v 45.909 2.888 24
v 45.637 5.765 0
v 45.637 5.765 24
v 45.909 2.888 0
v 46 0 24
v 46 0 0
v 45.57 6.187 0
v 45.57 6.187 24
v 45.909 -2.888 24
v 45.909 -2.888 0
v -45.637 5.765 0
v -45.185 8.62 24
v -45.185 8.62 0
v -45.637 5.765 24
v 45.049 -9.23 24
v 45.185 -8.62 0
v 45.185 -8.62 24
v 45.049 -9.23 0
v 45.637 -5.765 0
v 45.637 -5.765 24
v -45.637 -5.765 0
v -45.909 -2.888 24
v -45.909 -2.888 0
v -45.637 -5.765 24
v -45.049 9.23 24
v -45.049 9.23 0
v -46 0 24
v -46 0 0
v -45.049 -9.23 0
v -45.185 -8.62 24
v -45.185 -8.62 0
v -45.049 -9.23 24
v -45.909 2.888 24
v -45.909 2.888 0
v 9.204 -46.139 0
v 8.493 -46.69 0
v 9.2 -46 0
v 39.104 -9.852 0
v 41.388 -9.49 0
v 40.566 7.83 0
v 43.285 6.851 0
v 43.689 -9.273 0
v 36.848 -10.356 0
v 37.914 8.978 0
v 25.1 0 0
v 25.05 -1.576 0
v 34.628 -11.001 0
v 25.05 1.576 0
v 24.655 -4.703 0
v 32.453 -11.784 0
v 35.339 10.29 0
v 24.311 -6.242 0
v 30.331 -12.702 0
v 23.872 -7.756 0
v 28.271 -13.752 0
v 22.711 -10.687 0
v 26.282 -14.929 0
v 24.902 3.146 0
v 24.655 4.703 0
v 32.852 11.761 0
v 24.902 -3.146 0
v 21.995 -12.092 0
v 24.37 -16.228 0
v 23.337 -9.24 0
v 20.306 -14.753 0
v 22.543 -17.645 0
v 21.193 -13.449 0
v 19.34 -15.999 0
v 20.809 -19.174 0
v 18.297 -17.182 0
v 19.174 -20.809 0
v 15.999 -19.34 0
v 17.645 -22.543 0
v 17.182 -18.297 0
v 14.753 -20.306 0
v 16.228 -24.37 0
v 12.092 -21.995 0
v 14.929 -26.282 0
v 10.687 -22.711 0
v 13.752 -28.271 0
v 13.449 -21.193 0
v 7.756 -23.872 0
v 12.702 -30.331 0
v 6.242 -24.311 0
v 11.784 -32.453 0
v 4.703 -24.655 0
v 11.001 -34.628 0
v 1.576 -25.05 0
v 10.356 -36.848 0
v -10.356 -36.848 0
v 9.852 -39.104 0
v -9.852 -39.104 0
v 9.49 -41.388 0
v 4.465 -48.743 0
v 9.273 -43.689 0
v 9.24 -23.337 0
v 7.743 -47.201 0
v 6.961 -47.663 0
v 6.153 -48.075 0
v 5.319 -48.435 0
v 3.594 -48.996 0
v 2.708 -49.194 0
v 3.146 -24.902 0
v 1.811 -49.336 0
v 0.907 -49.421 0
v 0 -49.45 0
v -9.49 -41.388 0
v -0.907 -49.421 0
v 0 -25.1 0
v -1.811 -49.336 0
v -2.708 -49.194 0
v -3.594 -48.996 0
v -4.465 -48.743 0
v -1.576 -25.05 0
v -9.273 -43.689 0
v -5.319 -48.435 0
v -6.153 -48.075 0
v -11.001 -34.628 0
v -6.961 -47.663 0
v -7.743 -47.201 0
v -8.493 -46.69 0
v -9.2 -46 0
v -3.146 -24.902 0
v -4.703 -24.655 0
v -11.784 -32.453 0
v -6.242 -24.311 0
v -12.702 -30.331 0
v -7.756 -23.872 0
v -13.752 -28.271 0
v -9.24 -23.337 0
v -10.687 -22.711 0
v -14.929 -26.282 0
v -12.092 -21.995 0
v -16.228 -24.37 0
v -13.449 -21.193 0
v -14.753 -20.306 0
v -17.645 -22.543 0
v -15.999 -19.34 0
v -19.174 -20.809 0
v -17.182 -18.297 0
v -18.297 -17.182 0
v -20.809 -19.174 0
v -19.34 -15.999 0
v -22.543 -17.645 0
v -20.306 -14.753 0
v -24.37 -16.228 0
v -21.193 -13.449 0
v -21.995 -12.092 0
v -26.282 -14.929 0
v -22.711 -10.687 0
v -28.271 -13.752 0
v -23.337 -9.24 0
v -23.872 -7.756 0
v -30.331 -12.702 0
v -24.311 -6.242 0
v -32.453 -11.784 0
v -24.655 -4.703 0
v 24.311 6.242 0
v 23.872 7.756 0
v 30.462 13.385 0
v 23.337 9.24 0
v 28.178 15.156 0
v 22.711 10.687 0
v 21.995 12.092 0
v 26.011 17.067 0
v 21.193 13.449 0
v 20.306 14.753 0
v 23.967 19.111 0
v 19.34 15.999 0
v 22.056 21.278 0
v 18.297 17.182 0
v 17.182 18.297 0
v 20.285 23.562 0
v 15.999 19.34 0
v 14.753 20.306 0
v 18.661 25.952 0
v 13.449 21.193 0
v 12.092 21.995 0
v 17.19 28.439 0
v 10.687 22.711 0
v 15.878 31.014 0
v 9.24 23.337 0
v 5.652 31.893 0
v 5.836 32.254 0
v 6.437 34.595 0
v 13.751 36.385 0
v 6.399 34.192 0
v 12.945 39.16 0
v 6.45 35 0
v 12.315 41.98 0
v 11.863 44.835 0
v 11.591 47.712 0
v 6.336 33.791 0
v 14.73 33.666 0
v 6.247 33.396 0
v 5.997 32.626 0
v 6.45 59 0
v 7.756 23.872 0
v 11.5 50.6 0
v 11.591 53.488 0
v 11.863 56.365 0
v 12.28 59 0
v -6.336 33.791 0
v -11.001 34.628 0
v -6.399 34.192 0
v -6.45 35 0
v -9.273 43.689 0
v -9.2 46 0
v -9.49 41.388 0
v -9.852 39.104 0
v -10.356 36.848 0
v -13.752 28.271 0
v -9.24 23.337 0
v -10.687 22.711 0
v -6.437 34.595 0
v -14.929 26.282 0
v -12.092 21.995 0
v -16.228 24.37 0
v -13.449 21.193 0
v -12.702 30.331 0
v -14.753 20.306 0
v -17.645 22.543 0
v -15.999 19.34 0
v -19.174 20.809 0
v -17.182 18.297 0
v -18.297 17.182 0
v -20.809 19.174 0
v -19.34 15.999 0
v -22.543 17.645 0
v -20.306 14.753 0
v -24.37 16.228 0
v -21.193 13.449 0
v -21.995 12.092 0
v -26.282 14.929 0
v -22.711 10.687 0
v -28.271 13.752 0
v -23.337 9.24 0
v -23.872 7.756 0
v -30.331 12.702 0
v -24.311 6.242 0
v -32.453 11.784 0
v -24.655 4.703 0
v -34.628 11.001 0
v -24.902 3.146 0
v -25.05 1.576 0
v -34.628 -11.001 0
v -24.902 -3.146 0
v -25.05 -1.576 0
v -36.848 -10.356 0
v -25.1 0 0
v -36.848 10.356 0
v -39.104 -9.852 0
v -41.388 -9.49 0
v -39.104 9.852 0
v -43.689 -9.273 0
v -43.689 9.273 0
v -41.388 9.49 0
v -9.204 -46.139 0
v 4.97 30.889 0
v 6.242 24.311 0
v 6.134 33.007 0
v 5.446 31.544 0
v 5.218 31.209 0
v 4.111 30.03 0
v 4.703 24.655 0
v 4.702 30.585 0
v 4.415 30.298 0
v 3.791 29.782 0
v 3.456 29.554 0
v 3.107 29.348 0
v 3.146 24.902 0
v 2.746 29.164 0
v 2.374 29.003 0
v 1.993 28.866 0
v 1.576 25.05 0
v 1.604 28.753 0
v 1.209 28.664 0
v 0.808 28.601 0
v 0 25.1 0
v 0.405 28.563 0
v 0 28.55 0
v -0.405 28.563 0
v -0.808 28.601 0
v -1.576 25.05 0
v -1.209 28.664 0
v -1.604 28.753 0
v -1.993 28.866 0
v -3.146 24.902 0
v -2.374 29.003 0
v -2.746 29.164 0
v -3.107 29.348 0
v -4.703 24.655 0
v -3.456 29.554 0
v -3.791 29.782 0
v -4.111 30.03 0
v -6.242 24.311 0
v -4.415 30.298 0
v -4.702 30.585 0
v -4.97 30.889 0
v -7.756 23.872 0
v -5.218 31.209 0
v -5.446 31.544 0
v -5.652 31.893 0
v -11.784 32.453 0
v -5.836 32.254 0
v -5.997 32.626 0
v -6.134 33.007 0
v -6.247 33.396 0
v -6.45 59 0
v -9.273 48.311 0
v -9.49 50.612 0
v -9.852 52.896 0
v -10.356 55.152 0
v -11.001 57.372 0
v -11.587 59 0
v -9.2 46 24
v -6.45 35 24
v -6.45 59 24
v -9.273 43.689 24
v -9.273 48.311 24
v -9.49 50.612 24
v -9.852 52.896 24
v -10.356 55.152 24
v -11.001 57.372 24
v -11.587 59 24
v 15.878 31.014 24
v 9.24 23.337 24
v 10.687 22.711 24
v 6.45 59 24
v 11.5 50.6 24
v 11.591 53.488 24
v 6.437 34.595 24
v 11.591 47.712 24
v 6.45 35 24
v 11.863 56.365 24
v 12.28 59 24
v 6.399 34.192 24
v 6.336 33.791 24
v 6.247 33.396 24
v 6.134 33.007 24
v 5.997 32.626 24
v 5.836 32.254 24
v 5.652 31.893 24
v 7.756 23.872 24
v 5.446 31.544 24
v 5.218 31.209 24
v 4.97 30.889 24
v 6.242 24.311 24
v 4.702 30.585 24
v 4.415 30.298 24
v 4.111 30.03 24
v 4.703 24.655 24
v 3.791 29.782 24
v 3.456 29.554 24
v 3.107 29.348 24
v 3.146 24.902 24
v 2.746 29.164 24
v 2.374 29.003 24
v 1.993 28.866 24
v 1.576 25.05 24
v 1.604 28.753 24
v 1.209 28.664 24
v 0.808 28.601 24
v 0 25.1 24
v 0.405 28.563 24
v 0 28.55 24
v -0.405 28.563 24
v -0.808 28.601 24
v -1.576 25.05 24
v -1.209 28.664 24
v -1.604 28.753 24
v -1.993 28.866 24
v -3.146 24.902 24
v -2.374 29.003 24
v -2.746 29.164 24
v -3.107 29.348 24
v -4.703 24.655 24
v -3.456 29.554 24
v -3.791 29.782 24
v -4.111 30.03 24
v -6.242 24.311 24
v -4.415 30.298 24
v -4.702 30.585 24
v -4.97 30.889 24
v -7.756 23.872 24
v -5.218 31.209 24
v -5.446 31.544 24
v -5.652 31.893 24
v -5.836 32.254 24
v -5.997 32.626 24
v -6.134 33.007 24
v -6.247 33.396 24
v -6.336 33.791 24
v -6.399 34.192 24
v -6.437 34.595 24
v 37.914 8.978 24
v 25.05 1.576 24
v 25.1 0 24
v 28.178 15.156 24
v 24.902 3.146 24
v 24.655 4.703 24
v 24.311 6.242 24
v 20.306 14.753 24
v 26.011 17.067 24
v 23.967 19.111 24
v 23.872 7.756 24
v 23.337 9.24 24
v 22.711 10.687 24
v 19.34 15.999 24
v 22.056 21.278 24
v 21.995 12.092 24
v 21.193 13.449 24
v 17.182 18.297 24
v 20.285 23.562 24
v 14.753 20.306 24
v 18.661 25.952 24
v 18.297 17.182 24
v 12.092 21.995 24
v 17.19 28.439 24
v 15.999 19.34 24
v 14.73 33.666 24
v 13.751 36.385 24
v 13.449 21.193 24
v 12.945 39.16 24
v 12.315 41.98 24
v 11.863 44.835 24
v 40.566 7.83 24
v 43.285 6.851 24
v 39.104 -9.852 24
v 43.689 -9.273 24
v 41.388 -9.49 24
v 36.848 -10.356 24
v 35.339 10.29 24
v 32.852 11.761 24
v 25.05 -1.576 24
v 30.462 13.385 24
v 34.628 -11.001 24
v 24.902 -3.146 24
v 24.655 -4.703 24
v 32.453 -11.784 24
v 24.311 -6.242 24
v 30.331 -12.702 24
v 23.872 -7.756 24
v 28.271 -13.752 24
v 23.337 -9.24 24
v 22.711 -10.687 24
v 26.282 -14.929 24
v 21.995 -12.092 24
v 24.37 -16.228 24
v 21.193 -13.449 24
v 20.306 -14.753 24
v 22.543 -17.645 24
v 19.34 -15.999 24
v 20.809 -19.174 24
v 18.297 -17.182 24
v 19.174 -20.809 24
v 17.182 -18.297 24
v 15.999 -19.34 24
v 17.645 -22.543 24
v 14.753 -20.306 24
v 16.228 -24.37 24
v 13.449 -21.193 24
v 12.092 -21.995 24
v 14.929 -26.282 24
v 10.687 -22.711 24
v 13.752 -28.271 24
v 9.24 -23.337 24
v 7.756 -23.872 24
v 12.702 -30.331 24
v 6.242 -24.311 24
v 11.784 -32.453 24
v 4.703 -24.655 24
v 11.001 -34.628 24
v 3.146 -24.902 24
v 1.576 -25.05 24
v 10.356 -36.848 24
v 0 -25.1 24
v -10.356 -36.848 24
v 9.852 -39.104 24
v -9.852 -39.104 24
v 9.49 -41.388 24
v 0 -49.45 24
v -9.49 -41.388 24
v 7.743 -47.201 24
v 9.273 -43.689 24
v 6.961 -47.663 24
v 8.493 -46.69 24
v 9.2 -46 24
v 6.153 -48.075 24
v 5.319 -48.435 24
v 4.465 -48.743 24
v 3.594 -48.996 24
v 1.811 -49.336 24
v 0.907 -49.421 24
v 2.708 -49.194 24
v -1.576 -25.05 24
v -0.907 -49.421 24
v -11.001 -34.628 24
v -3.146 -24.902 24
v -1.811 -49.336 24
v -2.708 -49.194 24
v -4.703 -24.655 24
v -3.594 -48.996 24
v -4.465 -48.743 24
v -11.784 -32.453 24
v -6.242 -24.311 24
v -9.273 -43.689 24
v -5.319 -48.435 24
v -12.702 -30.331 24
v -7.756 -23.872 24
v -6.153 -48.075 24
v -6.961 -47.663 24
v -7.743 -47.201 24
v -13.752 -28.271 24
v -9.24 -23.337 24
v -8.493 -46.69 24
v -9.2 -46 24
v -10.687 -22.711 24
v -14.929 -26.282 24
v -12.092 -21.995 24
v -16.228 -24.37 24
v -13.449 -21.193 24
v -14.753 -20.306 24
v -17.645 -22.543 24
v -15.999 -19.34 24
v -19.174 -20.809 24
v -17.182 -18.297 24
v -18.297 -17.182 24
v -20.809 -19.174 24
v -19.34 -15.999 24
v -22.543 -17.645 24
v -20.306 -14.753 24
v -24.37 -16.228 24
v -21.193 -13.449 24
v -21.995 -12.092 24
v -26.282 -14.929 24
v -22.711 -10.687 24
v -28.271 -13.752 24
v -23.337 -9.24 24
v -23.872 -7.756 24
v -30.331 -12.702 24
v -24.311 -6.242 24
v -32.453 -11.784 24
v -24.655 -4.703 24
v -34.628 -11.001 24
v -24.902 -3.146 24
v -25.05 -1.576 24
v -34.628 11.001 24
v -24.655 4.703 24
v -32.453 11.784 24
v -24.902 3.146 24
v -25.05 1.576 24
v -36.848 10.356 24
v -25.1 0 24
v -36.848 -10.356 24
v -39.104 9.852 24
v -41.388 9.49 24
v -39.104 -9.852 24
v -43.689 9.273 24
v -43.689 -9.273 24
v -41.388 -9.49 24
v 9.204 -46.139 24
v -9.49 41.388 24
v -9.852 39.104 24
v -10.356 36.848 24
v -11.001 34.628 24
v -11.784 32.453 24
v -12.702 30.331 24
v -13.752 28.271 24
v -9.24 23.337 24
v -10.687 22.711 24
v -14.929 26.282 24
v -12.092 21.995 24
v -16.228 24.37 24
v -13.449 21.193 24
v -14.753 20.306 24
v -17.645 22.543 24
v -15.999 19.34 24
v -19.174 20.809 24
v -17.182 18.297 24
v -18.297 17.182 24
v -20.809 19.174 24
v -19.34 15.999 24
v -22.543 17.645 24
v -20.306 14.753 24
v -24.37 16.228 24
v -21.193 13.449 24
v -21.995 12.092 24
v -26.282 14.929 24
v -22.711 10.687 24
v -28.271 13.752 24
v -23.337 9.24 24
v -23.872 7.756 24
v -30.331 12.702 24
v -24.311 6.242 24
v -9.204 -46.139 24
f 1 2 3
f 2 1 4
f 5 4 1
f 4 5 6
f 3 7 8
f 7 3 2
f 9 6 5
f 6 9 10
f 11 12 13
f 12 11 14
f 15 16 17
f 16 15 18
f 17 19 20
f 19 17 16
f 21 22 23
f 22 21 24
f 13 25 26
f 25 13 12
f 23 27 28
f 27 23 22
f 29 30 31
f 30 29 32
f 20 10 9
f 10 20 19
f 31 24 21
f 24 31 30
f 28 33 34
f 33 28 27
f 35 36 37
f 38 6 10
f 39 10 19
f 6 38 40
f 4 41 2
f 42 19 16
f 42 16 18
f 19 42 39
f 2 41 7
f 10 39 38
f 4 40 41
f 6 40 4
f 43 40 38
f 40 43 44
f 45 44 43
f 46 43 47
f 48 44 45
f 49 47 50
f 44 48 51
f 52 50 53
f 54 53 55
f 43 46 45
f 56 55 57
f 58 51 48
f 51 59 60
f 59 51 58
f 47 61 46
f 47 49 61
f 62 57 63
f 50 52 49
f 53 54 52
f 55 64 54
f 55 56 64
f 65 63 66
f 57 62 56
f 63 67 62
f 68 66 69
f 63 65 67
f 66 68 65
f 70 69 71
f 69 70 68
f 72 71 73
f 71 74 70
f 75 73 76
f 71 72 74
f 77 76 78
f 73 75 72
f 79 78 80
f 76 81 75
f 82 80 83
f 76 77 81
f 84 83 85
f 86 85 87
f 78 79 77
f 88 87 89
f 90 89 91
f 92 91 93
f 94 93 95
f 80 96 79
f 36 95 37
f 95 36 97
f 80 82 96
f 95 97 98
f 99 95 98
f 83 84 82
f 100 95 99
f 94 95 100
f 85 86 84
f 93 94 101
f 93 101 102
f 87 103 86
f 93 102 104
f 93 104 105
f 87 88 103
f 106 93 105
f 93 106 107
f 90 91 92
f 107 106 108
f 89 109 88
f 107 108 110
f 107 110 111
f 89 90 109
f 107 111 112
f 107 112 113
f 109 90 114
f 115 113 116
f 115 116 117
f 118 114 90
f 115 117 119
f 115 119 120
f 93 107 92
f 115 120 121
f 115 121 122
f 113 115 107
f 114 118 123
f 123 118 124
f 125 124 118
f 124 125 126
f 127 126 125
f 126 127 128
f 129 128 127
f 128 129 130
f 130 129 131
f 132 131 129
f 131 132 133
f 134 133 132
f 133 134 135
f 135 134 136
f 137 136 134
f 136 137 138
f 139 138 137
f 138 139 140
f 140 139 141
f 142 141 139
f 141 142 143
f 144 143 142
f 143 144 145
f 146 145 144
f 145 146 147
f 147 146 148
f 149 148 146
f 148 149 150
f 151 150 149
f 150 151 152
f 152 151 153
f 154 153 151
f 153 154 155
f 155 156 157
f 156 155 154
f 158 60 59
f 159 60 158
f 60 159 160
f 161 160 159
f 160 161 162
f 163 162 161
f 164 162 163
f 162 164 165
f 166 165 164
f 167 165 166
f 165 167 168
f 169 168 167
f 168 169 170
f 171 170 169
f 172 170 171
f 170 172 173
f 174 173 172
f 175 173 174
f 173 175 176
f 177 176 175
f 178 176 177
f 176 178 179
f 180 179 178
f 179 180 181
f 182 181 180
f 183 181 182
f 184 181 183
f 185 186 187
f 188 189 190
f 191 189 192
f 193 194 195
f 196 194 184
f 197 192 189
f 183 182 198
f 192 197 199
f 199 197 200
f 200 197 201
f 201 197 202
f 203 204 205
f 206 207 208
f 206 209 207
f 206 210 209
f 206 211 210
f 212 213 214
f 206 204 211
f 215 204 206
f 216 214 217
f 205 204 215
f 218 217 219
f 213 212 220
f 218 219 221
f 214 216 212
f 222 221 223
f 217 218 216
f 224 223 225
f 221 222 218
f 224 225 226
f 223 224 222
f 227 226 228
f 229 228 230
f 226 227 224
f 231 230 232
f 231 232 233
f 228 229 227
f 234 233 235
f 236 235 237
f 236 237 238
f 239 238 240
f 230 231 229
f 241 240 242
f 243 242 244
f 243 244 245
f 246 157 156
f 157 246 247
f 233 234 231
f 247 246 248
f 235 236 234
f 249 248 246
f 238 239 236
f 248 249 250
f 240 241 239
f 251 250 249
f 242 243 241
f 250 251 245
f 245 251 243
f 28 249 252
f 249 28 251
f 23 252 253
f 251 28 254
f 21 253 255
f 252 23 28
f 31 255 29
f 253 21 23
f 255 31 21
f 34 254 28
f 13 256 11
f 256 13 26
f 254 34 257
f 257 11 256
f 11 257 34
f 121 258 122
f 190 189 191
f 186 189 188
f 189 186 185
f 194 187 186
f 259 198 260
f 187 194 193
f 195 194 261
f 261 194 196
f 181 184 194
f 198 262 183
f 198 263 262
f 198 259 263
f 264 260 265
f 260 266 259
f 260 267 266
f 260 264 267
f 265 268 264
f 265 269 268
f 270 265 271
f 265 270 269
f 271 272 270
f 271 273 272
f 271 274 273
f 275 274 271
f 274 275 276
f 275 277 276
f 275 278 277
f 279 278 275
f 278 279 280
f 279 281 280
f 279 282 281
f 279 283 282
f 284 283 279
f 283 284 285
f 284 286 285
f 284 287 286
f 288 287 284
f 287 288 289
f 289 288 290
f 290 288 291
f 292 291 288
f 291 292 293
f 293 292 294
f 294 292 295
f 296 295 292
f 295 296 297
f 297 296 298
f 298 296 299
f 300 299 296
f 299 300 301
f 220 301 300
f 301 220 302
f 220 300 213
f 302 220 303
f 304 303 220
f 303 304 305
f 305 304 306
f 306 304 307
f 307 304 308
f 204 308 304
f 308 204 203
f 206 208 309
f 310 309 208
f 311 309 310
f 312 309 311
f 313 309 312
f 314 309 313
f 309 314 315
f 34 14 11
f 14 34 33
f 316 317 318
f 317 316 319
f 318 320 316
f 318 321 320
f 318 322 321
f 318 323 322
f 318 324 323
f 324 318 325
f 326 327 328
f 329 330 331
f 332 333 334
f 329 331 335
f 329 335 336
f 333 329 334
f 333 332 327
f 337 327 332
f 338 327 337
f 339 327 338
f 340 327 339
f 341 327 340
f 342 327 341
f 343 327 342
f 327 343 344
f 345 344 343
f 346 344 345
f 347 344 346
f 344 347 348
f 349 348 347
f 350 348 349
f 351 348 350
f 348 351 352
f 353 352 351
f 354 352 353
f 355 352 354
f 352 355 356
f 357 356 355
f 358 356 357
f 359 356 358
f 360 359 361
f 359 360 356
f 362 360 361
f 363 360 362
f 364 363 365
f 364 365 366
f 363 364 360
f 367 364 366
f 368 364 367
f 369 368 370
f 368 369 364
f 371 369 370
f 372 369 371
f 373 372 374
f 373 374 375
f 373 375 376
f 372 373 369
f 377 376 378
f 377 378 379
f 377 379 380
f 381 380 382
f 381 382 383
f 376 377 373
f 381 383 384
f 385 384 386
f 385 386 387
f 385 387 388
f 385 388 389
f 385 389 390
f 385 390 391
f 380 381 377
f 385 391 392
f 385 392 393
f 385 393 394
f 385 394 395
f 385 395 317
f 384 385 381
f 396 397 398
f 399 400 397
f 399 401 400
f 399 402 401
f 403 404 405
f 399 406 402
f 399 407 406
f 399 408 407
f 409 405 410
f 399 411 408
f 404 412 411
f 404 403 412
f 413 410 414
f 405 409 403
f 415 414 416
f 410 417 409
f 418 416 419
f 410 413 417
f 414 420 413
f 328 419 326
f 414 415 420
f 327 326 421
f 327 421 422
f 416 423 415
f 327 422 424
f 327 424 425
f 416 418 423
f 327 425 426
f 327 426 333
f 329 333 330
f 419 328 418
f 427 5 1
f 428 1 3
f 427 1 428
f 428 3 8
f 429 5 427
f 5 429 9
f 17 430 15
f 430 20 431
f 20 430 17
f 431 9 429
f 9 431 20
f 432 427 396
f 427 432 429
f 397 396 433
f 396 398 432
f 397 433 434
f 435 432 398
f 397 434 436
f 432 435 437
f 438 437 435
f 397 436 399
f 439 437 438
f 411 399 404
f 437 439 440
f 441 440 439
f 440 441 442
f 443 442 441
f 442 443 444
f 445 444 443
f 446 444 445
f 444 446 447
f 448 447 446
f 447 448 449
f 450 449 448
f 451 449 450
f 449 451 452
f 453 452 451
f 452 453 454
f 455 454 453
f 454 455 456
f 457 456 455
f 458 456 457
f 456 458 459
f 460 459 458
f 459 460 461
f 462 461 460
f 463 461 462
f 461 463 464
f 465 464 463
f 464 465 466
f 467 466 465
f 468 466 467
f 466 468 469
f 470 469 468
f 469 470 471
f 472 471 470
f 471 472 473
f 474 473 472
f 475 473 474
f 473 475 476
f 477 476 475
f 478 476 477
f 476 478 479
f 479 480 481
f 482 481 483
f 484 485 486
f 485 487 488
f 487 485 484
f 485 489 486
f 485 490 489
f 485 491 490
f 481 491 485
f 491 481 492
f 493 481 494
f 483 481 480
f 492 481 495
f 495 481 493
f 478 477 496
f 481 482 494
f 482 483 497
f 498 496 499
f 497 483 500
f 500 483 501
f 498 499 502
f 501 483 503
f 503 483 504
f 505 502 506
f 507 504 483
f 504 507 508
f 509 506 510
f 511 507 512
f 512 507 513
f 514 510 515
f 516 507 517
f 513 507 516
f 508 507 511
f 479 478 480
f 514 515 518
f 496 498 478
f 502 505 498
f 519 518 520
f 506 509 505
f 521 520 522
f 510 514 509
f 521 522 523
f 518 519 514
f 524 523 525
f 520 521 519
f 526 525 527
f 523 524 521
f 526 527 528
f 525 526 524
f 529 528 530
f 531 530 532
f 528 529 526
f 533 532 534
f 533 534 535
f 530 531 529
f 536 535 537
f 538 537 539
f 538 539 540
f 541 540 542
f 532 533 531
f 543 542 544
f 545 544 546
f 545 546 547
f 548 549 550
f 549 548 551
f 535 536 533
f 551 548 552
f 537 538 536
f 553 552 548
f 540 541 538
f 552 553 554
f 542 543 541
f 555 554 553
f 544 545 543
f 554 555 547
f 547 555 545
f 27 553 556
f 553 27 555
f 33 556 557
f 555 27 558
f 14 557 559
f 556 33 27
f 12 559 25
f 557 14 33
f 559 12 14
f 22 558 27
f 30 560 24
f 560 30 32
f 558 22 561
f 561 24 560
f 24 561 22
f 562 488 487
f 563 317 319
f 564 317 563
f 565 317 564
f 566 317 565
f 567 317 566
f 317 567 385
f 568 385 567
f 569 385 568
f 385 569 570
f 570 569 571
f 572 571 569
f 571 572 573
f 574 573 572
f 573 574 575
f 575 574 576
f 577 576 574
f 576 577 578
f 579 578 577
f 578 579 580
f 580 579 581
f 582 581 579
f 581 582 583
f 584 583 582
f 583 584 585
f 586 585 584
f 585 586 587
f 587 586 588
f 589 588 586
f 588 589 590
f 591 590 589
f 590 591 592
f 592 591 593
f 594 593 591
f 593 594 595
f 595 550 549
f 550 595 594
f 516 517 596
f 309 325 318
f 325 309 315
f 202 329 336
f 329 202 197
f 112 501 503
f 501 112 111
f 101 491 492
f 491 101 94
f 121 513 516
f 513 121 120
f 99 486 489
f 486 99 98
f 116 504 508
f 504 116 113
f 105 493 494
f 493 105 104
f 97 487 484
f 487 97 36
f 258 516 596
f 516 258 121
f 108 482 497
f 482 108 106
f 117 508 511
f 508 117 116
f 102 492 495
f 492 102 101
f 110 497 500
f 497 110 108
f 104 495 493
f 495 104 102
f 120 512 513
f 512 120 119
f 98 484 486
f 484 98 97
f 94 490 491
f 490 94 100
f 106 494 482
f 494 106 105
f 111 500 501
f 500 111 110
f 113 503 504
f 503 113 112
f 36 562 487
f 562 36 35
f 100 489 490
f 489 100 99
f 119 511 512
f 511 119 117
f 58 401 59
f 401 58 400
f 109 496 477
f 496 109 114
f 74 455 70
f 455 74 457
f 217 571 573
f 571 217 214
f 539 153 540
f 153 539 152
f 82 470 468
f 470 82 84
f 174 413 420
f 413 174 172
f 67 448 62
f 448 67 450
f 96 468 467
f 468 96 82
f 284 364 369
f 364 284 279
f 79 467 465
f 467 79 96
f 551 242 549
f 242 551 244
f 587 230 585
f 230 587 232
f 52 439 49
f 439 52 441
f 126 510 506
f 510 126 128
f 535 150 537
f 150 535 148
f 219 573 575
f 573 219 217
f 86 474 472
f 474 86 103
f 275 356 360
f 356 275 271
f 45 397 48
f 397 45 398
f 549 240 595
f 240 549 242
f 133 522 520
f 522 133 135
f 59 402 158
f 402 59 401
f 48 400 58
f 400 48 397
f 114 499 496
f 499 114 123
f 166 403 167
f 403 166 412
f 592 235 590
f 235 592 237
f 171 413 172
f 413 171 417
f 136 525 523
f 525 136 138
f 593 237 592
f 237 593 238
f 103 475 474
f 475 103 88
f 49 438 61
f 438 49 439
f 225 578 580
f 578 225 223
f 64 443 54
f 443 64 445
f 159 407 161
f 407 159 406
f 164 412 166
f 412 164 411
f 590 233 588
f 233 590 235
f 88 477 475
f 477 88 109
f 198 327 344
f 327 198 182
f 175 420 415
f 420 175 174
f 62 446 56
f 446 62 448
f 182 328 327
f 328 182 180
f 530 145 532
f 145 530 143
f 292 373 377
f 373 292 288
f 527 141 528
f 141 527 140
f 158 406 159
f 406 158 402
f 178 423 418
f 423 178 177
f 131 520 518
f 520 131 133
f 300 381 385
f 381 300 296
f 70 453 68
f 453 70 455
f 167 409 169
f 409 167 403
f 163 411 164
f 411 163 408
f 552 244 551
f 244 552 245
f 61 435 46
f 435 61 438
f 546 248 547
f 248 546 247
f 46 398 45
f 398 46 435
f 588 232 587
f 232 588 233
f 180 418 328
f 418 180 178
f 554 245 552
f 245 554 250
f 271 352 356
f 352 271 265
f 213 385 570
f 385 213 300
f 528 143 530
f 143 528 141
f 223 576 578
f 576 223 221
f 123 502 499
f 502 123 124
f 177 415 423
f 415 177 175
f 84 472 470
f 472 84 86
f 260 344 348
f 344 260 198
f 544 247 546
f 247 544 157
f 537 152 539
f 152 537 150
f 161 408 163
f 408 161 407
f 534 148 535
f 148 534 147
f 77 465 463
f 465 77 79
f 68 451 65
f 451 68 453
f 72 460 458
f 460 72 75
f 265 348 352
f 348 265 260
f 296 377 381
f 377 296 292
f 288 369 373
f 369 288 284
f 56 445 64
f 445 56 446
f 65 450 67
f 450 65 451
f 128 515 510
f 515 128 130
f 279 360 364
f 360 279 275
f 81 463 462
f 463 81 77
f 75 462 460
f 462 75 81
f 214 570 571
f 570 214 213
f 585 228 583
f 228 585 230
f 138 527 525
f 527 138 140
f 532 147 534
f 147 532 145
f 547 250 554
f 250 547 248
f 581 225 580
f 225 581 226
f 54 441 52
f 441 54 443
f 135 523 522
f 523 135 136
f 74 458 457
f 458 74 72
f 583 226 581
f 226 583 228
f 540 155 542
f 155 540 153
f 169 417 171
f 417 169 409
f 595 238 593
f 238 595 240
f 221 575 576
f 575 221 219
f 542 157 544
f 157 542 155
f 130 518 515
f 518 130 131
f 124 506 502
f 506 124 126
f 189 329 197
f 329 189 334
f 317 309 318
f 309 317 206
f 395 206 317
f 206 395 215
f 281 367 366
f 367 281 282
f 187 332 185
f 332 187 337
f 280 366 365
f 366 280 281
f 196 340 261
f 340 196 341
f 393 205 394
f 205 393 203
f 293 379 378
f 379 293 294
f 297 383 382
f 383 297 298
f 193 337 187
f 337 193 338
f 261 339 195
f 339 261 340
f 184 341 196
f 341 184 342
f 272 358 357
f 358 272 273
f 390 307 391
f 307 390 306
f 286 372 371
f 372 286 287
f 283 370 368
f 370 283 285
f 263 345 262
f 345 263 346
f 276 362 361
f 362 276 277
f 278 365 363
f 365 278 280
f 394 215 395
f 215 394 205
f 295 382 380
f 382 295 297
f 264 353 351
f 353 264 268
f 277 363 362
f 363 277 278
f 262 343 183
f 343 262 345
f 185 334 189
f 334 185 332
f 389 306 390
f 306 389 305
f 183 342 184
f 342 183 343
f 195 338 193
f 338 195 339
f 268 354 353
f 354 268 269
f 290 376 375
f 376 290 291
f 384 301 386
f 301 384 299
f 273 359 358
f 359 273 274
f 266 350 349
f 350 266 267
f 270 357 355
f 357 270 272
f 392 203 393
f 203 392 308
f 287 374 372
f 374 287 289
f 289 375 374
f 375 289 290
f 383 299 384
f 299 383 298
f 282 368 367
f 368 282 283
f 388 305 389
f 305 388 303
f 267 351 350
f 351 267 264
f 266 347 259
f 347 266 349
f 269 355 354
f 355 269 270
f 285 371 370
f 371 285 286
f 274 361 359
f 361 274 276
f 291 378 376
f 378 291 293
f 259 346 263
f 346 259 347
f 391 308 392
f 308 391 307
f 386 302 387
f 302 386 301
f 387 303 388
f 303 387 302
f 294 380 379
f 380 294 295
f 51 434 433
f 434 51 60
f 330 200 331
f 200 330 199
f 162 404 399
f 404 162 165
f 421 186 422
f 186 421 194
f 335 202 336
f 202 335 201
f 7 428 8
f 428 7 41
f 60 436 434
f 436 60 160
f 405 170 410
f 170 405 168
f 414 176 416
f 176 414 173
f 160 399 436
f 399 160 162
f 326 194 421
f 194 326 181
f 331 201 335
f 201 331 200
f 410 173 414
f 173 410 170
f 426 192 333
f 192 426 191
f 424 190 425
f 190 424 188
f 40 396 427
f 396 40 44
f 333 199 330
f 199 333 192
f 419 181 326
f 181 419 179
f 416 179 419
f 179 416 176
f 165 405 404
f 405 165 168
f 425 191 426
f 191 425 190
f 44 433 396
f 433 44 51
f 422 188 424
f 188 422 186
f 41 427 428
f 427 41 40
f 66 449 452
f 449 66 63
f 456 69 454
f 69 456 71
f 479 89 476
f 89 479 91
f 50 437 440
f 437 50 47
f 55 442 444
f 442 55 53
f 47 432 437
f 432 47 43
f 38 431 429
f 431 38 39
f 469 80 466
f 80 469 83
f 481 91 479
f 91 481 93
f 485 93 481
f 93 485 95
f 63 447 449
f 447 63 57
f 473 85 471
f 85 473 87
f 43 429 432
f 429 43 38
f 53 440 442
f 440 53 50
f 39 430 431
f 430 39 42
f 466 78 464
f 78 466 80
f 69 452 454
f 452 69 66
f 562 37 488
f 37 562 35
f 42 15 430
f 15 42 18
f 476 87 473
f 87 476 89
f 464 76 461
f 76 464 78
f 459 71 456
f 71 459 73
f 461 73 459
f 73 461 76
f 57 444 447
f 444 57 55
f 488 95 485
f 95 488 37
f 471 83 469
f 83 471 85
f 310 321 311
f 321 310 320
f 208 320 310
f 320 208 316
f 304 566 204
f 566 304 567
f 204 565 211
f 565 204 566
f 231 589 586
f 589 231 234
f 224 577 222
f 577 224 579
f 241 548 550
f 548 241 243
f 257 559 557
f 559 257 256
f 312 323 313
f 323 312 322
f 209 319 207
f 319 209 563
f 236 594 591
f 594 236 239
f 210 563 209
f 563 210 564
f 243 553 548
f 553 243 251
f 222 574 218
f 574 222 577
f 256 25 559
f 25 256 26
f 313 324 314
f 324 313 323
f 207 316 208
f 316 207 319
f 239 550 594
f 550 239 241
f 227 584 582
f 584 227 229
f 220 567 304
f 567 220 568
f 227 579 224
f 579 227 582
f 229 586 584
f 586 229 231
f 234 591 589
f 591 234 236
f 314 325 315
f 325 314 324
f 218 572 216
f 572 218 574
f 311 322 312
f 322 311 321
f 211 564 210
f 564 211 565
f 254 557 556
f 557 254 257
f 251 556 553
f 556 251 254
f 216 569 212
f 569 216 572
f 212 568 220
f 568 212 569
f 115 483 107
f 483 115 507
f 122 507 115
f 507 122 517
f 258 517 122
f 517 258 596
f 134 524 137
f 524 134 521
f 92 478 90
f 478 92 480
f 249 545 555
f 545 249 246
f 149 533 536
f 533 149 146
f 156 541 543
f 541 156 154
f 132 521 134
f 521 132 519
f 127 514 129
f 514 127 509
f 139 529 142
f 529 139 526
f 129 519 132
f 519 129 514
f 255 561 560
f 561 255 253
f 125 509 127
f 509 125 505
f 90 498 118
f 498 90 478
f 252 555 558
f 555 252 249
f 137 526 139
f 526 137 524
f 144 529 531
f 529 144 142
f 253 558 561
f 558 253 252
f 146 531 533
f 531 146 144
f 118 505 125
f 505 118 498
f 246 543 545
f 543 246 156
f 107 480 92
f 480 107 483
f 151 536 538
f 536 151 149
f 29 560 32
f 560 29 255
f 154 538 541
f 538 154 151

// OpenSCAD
// file: ../../lib/water/level_meter.scad
sides = 100;

// Water level meter measurements

// trubka prumer 50, plast 1.8 2m, 70 Kc
// POLOLU VL53L0X TIME-OF-FLIGHT DISTANCE SENSOR, 280 Kc
// https://www.tme.eu/cz/details/pololu-2490/moduly-cidel/pololu/vl53l0x-time-of-flight-distance-sensor/

module cable_holder() {
    translate([-4,-4*3,0])
        difference() {
            cube([8,8*3,8]);
            translate([-0.05,8,0])
                cube([8.1,8,4]);
        }
}

module glass_holder(glass_width){
    
    inner_hole_width = glass_width - 3.5;
    inner_hull_width = glass_width - 1;

    outer_hull_width = glass_width + 5;
    outer_hole_width = glass_width + 1;

    difference() {
        translate([-inner_hull_width/2,-inner_hull_width/2,0])
            cube([inner_hull_width,inner_hull_width,1]);
        translate([-inner_hole_width/2,-inner_hole_width/2,-0.05])
            cube([inner_hole_width,inner_hole_width,1.1]);
    }


    difference() {
        translate([-outer_hull_width/2,-outer_hull_width/2,0])
            cube([outer_hull_width,outer_hull_width,2]);
        translate([-outer_hole_width/2,-outer_hole_width/2,-0.05])
            cube([outer_hole_width,outer_hole_width,2.1]);
    }
}

module pipe(pipe_diameter,pipe_hull,height){
       difference() {
            cylinder(r=pipe_diameter/2+pipe_hull, h=height, $fn=sides);
        translate([0,0,-0.05])

            cylinder(r=pipe_diameter/2, h=height+0.1, $fn=sides);
       }

    }


module distance_meter_bottom(pipe_diameter,pipe_hull,depth)
{
    pipe_radius = pipe_diameter/2;
    bottom_radius = 3*pipe_radius;

    difference() {
        union() {
            //pipe holder
//            cylinder(r=pipe_radius, h=2*depth, $fn=sides);
            cylinder(r=bottom_radius, h=depth, $fn=sides);
            cylinder(r=pipe_radius+pipe_hull+depth, h=7*depth, $fn=sides);
        }
        // draining hole
        translate([-1/2*depth,-bottom_radius-0.05,-0.05])
            cube([depth,bottom_radius*2+0.1,depth/2+.1]);
        translate([-bottom_radius-0.05,-1/2*depth,-0.05])
            cube([bottom_radius*2+0.1,depth,depth/2+.1]);

        //pipe holder
        translate([0,0,-0.05])
            cylinder(r=pipe_radius-depth/2, h=2*depth+.1, $fn=sides);
      //  translate([0,0,-0.05])
       //     cylinder(r=pipe_radius, h=depth+.1, $fn=sides);
        translate([0,0,10])
            cylinder(r=pipe_radius+pipe_hull+0.1, h=6*depth+.1, $fn=sides);
        // bottom cuts
        translate([bottom_radius,bottom_radius,-0.05])
            cylinder(r=bottom_radius*8/10, h=depth+.1, $fn=sides);
        translate([bottom_radius,-bottom_radius,-0.05])
            cylinder(r=bottom_radius*8/10, h=depth+.1, $fn=sides);
        translate([-bottom_radius,bottom_radius,-0.05])
            cylinder(r=bottom_radius*8/10, h=depth+.1, $fn=sides);
        translate([-bottom_radius,-bottom_radius,-0.05])
            cylinder(r=bottom_radius*8/10, h=depth+.1, $fn=sides);

         translate([-40,0,depth*4]) rotate([0,90,0])
            cylinder(r=3, h=80, $fn=sides);
         translate([0,40,depth*5]) rotate([90,0,0])
            cylinder(r=3, h=80, $fn=sides);
    }

}

module distance_meter_top(pipe_diameter,pipe_hull,depth)
{
    pipe_radius = pipe_diameter/2;
    bottom_radius = 3*pipe_radius;

    conn_hole = 7*2.54+2;

    difference() {
        union() {
            //pipe holder
            cylinder(r=pipe_radius, h=22, $fn=sides);
            cylinder(r=bottom_radius, h=depth, $fn=sides);
            cylinder(r=pipe_radius+pipe_hull+depth, h=4*depth, $fn=sides);
          //  translate([-1/2*depth,-bottom_radius-0.05,-0.05])
            //   cube([depth,bottom_radius*2+0.1,depth/2+.1]);

        }
        //sensor_hole
        translate([-conn_hole/2,-7.5,20])
            cube([conn_hole,15,3]);

        //thru hole
        translate([-conn_hole/2,7.5-2.64,-0.05])
            cube([conn_hole,2.64,24]);

//        translate([-conn_hole/2,6-7*2.55,-0.05])
//            cube([conn_hole,2.55*5,22+.1]);

        // bottom conn_hole
        translate([-conn_hole/2,7,-0.05])
            cube([conn_hole,10,depth+.1]);
        translate([-10/2,-25,-0.05])
            cube([10,20,depth+.1]);

        // cable hole
        translate([0,5,4]) rotate([90,0,0])
            cylinder(r=3,h=100,$fn=sides);

        //pipe holder
        translate([0,0,22])
            cylinder(r=pipe_radius+pipe_hull+.1, h=5*depth+.1, $fn=sides);

        // bottom cuts
        translate([bottom_radius,bottom_radius,-0.05])
            cylinder(r=bottom_radius*8/10, h=depth+.1, $fn=sides);
        translate([bottom_radius,-bottom_radius,-0.05])
            cylinder(r=bottom_radius*8/10, h=depth+.1, $fn=sides);
        translate([-bottom_radius,bottom_radius,-0.05])
            cylinder(r=bottom_radius*8/10, h=depth+.1, $fn=sides);
        translate([-bottom_radius,-bottom_radius,-0.05])
            cylinder(r=bottom_radius*8/10, h=depth+.1, $fn=sides);
    }
    
    translate([0,0,21.5]) glass_holder(24);
    translate([0,bottom_radius-4*3-3,depth]) cable_holder();
    translate([0,-(bottom_radius-4*3-3),depth]) cable_holder();
    translate([bottom_radius-4*3-3,0,depth]) rotate([0,0,90]) cable_holder();
    translate([-(bottom_radius-4*3-3),0,depth]) rotate([0,0,90]) cable_holder();

}


module probe_holder(pipe_diameter,pipe_hull,depth)
{
    pipe_radius = pipe_diameter/2;
    bottom_radius = 2*pipe_radius;

    probe_radius = 12.9/2;

    difference() {
        union() {
            //pipe holder
            cylinder(r=bottom_radius, h=3*depth, $fn=sides);
            


        translate([-probe_radius-depth,35+depth/2,0])
            cube([probe_radius*2+depth*2,20,3*depth]);
        translate([0,35,0])
            cylinder(r=probe_radius+depth, h=3*depth, $fn=sides);


        translate([-probe_radius-depth,-35-depth/2,0])
            cube([probe_radius*2+depth*2,20,3*depth]);
        translate([0,-35,0])
            cylinder(r=probe_radius+depth, h=3*depth, $fn=sides);


        }
        // pipe cut
        translate([0,0,-.05])
            cylinder(r=pipe_radius+pipe_hull+.1, h=3*depth+.1, $fn=sides);

        translate([-probe_radius,35,-.05])
            cube([probe_radius*2,100,3*depth+.1]);
        translate([0,35,-.05])
            cylinder(r=probe_radius, h=3*depth+.1, $fn=sides);

        // bottom cuts
        translate([bottom_radius*1.25,bottom_radius*1.1,-0.05])
            cylinder(r=bottom_radius*10/10, h=3*depth+.1, $fn=sides);
        translate([bottom_radius,-bottom_radius,-0.05])
            cylinder(r=bottom_radius*8/10, h=3*depth+.1, $fn=sides);
        translate([-bottom_radius,bottom_radius,-0.05])
            cylinder(r=bottom_radius*8/10, h=3*depth+.1, $fn=sides);
        translate([-bottom_radius,-bottom_radius,-0.05])
            cylinder(r=bottom_radius*8/10, h=3*depth+.1, $fn=sides);
    }
    
}
// main file
include <../../lib/water/level_meter.scad>;

sides = 100;

probe_holder(46,2,8);
